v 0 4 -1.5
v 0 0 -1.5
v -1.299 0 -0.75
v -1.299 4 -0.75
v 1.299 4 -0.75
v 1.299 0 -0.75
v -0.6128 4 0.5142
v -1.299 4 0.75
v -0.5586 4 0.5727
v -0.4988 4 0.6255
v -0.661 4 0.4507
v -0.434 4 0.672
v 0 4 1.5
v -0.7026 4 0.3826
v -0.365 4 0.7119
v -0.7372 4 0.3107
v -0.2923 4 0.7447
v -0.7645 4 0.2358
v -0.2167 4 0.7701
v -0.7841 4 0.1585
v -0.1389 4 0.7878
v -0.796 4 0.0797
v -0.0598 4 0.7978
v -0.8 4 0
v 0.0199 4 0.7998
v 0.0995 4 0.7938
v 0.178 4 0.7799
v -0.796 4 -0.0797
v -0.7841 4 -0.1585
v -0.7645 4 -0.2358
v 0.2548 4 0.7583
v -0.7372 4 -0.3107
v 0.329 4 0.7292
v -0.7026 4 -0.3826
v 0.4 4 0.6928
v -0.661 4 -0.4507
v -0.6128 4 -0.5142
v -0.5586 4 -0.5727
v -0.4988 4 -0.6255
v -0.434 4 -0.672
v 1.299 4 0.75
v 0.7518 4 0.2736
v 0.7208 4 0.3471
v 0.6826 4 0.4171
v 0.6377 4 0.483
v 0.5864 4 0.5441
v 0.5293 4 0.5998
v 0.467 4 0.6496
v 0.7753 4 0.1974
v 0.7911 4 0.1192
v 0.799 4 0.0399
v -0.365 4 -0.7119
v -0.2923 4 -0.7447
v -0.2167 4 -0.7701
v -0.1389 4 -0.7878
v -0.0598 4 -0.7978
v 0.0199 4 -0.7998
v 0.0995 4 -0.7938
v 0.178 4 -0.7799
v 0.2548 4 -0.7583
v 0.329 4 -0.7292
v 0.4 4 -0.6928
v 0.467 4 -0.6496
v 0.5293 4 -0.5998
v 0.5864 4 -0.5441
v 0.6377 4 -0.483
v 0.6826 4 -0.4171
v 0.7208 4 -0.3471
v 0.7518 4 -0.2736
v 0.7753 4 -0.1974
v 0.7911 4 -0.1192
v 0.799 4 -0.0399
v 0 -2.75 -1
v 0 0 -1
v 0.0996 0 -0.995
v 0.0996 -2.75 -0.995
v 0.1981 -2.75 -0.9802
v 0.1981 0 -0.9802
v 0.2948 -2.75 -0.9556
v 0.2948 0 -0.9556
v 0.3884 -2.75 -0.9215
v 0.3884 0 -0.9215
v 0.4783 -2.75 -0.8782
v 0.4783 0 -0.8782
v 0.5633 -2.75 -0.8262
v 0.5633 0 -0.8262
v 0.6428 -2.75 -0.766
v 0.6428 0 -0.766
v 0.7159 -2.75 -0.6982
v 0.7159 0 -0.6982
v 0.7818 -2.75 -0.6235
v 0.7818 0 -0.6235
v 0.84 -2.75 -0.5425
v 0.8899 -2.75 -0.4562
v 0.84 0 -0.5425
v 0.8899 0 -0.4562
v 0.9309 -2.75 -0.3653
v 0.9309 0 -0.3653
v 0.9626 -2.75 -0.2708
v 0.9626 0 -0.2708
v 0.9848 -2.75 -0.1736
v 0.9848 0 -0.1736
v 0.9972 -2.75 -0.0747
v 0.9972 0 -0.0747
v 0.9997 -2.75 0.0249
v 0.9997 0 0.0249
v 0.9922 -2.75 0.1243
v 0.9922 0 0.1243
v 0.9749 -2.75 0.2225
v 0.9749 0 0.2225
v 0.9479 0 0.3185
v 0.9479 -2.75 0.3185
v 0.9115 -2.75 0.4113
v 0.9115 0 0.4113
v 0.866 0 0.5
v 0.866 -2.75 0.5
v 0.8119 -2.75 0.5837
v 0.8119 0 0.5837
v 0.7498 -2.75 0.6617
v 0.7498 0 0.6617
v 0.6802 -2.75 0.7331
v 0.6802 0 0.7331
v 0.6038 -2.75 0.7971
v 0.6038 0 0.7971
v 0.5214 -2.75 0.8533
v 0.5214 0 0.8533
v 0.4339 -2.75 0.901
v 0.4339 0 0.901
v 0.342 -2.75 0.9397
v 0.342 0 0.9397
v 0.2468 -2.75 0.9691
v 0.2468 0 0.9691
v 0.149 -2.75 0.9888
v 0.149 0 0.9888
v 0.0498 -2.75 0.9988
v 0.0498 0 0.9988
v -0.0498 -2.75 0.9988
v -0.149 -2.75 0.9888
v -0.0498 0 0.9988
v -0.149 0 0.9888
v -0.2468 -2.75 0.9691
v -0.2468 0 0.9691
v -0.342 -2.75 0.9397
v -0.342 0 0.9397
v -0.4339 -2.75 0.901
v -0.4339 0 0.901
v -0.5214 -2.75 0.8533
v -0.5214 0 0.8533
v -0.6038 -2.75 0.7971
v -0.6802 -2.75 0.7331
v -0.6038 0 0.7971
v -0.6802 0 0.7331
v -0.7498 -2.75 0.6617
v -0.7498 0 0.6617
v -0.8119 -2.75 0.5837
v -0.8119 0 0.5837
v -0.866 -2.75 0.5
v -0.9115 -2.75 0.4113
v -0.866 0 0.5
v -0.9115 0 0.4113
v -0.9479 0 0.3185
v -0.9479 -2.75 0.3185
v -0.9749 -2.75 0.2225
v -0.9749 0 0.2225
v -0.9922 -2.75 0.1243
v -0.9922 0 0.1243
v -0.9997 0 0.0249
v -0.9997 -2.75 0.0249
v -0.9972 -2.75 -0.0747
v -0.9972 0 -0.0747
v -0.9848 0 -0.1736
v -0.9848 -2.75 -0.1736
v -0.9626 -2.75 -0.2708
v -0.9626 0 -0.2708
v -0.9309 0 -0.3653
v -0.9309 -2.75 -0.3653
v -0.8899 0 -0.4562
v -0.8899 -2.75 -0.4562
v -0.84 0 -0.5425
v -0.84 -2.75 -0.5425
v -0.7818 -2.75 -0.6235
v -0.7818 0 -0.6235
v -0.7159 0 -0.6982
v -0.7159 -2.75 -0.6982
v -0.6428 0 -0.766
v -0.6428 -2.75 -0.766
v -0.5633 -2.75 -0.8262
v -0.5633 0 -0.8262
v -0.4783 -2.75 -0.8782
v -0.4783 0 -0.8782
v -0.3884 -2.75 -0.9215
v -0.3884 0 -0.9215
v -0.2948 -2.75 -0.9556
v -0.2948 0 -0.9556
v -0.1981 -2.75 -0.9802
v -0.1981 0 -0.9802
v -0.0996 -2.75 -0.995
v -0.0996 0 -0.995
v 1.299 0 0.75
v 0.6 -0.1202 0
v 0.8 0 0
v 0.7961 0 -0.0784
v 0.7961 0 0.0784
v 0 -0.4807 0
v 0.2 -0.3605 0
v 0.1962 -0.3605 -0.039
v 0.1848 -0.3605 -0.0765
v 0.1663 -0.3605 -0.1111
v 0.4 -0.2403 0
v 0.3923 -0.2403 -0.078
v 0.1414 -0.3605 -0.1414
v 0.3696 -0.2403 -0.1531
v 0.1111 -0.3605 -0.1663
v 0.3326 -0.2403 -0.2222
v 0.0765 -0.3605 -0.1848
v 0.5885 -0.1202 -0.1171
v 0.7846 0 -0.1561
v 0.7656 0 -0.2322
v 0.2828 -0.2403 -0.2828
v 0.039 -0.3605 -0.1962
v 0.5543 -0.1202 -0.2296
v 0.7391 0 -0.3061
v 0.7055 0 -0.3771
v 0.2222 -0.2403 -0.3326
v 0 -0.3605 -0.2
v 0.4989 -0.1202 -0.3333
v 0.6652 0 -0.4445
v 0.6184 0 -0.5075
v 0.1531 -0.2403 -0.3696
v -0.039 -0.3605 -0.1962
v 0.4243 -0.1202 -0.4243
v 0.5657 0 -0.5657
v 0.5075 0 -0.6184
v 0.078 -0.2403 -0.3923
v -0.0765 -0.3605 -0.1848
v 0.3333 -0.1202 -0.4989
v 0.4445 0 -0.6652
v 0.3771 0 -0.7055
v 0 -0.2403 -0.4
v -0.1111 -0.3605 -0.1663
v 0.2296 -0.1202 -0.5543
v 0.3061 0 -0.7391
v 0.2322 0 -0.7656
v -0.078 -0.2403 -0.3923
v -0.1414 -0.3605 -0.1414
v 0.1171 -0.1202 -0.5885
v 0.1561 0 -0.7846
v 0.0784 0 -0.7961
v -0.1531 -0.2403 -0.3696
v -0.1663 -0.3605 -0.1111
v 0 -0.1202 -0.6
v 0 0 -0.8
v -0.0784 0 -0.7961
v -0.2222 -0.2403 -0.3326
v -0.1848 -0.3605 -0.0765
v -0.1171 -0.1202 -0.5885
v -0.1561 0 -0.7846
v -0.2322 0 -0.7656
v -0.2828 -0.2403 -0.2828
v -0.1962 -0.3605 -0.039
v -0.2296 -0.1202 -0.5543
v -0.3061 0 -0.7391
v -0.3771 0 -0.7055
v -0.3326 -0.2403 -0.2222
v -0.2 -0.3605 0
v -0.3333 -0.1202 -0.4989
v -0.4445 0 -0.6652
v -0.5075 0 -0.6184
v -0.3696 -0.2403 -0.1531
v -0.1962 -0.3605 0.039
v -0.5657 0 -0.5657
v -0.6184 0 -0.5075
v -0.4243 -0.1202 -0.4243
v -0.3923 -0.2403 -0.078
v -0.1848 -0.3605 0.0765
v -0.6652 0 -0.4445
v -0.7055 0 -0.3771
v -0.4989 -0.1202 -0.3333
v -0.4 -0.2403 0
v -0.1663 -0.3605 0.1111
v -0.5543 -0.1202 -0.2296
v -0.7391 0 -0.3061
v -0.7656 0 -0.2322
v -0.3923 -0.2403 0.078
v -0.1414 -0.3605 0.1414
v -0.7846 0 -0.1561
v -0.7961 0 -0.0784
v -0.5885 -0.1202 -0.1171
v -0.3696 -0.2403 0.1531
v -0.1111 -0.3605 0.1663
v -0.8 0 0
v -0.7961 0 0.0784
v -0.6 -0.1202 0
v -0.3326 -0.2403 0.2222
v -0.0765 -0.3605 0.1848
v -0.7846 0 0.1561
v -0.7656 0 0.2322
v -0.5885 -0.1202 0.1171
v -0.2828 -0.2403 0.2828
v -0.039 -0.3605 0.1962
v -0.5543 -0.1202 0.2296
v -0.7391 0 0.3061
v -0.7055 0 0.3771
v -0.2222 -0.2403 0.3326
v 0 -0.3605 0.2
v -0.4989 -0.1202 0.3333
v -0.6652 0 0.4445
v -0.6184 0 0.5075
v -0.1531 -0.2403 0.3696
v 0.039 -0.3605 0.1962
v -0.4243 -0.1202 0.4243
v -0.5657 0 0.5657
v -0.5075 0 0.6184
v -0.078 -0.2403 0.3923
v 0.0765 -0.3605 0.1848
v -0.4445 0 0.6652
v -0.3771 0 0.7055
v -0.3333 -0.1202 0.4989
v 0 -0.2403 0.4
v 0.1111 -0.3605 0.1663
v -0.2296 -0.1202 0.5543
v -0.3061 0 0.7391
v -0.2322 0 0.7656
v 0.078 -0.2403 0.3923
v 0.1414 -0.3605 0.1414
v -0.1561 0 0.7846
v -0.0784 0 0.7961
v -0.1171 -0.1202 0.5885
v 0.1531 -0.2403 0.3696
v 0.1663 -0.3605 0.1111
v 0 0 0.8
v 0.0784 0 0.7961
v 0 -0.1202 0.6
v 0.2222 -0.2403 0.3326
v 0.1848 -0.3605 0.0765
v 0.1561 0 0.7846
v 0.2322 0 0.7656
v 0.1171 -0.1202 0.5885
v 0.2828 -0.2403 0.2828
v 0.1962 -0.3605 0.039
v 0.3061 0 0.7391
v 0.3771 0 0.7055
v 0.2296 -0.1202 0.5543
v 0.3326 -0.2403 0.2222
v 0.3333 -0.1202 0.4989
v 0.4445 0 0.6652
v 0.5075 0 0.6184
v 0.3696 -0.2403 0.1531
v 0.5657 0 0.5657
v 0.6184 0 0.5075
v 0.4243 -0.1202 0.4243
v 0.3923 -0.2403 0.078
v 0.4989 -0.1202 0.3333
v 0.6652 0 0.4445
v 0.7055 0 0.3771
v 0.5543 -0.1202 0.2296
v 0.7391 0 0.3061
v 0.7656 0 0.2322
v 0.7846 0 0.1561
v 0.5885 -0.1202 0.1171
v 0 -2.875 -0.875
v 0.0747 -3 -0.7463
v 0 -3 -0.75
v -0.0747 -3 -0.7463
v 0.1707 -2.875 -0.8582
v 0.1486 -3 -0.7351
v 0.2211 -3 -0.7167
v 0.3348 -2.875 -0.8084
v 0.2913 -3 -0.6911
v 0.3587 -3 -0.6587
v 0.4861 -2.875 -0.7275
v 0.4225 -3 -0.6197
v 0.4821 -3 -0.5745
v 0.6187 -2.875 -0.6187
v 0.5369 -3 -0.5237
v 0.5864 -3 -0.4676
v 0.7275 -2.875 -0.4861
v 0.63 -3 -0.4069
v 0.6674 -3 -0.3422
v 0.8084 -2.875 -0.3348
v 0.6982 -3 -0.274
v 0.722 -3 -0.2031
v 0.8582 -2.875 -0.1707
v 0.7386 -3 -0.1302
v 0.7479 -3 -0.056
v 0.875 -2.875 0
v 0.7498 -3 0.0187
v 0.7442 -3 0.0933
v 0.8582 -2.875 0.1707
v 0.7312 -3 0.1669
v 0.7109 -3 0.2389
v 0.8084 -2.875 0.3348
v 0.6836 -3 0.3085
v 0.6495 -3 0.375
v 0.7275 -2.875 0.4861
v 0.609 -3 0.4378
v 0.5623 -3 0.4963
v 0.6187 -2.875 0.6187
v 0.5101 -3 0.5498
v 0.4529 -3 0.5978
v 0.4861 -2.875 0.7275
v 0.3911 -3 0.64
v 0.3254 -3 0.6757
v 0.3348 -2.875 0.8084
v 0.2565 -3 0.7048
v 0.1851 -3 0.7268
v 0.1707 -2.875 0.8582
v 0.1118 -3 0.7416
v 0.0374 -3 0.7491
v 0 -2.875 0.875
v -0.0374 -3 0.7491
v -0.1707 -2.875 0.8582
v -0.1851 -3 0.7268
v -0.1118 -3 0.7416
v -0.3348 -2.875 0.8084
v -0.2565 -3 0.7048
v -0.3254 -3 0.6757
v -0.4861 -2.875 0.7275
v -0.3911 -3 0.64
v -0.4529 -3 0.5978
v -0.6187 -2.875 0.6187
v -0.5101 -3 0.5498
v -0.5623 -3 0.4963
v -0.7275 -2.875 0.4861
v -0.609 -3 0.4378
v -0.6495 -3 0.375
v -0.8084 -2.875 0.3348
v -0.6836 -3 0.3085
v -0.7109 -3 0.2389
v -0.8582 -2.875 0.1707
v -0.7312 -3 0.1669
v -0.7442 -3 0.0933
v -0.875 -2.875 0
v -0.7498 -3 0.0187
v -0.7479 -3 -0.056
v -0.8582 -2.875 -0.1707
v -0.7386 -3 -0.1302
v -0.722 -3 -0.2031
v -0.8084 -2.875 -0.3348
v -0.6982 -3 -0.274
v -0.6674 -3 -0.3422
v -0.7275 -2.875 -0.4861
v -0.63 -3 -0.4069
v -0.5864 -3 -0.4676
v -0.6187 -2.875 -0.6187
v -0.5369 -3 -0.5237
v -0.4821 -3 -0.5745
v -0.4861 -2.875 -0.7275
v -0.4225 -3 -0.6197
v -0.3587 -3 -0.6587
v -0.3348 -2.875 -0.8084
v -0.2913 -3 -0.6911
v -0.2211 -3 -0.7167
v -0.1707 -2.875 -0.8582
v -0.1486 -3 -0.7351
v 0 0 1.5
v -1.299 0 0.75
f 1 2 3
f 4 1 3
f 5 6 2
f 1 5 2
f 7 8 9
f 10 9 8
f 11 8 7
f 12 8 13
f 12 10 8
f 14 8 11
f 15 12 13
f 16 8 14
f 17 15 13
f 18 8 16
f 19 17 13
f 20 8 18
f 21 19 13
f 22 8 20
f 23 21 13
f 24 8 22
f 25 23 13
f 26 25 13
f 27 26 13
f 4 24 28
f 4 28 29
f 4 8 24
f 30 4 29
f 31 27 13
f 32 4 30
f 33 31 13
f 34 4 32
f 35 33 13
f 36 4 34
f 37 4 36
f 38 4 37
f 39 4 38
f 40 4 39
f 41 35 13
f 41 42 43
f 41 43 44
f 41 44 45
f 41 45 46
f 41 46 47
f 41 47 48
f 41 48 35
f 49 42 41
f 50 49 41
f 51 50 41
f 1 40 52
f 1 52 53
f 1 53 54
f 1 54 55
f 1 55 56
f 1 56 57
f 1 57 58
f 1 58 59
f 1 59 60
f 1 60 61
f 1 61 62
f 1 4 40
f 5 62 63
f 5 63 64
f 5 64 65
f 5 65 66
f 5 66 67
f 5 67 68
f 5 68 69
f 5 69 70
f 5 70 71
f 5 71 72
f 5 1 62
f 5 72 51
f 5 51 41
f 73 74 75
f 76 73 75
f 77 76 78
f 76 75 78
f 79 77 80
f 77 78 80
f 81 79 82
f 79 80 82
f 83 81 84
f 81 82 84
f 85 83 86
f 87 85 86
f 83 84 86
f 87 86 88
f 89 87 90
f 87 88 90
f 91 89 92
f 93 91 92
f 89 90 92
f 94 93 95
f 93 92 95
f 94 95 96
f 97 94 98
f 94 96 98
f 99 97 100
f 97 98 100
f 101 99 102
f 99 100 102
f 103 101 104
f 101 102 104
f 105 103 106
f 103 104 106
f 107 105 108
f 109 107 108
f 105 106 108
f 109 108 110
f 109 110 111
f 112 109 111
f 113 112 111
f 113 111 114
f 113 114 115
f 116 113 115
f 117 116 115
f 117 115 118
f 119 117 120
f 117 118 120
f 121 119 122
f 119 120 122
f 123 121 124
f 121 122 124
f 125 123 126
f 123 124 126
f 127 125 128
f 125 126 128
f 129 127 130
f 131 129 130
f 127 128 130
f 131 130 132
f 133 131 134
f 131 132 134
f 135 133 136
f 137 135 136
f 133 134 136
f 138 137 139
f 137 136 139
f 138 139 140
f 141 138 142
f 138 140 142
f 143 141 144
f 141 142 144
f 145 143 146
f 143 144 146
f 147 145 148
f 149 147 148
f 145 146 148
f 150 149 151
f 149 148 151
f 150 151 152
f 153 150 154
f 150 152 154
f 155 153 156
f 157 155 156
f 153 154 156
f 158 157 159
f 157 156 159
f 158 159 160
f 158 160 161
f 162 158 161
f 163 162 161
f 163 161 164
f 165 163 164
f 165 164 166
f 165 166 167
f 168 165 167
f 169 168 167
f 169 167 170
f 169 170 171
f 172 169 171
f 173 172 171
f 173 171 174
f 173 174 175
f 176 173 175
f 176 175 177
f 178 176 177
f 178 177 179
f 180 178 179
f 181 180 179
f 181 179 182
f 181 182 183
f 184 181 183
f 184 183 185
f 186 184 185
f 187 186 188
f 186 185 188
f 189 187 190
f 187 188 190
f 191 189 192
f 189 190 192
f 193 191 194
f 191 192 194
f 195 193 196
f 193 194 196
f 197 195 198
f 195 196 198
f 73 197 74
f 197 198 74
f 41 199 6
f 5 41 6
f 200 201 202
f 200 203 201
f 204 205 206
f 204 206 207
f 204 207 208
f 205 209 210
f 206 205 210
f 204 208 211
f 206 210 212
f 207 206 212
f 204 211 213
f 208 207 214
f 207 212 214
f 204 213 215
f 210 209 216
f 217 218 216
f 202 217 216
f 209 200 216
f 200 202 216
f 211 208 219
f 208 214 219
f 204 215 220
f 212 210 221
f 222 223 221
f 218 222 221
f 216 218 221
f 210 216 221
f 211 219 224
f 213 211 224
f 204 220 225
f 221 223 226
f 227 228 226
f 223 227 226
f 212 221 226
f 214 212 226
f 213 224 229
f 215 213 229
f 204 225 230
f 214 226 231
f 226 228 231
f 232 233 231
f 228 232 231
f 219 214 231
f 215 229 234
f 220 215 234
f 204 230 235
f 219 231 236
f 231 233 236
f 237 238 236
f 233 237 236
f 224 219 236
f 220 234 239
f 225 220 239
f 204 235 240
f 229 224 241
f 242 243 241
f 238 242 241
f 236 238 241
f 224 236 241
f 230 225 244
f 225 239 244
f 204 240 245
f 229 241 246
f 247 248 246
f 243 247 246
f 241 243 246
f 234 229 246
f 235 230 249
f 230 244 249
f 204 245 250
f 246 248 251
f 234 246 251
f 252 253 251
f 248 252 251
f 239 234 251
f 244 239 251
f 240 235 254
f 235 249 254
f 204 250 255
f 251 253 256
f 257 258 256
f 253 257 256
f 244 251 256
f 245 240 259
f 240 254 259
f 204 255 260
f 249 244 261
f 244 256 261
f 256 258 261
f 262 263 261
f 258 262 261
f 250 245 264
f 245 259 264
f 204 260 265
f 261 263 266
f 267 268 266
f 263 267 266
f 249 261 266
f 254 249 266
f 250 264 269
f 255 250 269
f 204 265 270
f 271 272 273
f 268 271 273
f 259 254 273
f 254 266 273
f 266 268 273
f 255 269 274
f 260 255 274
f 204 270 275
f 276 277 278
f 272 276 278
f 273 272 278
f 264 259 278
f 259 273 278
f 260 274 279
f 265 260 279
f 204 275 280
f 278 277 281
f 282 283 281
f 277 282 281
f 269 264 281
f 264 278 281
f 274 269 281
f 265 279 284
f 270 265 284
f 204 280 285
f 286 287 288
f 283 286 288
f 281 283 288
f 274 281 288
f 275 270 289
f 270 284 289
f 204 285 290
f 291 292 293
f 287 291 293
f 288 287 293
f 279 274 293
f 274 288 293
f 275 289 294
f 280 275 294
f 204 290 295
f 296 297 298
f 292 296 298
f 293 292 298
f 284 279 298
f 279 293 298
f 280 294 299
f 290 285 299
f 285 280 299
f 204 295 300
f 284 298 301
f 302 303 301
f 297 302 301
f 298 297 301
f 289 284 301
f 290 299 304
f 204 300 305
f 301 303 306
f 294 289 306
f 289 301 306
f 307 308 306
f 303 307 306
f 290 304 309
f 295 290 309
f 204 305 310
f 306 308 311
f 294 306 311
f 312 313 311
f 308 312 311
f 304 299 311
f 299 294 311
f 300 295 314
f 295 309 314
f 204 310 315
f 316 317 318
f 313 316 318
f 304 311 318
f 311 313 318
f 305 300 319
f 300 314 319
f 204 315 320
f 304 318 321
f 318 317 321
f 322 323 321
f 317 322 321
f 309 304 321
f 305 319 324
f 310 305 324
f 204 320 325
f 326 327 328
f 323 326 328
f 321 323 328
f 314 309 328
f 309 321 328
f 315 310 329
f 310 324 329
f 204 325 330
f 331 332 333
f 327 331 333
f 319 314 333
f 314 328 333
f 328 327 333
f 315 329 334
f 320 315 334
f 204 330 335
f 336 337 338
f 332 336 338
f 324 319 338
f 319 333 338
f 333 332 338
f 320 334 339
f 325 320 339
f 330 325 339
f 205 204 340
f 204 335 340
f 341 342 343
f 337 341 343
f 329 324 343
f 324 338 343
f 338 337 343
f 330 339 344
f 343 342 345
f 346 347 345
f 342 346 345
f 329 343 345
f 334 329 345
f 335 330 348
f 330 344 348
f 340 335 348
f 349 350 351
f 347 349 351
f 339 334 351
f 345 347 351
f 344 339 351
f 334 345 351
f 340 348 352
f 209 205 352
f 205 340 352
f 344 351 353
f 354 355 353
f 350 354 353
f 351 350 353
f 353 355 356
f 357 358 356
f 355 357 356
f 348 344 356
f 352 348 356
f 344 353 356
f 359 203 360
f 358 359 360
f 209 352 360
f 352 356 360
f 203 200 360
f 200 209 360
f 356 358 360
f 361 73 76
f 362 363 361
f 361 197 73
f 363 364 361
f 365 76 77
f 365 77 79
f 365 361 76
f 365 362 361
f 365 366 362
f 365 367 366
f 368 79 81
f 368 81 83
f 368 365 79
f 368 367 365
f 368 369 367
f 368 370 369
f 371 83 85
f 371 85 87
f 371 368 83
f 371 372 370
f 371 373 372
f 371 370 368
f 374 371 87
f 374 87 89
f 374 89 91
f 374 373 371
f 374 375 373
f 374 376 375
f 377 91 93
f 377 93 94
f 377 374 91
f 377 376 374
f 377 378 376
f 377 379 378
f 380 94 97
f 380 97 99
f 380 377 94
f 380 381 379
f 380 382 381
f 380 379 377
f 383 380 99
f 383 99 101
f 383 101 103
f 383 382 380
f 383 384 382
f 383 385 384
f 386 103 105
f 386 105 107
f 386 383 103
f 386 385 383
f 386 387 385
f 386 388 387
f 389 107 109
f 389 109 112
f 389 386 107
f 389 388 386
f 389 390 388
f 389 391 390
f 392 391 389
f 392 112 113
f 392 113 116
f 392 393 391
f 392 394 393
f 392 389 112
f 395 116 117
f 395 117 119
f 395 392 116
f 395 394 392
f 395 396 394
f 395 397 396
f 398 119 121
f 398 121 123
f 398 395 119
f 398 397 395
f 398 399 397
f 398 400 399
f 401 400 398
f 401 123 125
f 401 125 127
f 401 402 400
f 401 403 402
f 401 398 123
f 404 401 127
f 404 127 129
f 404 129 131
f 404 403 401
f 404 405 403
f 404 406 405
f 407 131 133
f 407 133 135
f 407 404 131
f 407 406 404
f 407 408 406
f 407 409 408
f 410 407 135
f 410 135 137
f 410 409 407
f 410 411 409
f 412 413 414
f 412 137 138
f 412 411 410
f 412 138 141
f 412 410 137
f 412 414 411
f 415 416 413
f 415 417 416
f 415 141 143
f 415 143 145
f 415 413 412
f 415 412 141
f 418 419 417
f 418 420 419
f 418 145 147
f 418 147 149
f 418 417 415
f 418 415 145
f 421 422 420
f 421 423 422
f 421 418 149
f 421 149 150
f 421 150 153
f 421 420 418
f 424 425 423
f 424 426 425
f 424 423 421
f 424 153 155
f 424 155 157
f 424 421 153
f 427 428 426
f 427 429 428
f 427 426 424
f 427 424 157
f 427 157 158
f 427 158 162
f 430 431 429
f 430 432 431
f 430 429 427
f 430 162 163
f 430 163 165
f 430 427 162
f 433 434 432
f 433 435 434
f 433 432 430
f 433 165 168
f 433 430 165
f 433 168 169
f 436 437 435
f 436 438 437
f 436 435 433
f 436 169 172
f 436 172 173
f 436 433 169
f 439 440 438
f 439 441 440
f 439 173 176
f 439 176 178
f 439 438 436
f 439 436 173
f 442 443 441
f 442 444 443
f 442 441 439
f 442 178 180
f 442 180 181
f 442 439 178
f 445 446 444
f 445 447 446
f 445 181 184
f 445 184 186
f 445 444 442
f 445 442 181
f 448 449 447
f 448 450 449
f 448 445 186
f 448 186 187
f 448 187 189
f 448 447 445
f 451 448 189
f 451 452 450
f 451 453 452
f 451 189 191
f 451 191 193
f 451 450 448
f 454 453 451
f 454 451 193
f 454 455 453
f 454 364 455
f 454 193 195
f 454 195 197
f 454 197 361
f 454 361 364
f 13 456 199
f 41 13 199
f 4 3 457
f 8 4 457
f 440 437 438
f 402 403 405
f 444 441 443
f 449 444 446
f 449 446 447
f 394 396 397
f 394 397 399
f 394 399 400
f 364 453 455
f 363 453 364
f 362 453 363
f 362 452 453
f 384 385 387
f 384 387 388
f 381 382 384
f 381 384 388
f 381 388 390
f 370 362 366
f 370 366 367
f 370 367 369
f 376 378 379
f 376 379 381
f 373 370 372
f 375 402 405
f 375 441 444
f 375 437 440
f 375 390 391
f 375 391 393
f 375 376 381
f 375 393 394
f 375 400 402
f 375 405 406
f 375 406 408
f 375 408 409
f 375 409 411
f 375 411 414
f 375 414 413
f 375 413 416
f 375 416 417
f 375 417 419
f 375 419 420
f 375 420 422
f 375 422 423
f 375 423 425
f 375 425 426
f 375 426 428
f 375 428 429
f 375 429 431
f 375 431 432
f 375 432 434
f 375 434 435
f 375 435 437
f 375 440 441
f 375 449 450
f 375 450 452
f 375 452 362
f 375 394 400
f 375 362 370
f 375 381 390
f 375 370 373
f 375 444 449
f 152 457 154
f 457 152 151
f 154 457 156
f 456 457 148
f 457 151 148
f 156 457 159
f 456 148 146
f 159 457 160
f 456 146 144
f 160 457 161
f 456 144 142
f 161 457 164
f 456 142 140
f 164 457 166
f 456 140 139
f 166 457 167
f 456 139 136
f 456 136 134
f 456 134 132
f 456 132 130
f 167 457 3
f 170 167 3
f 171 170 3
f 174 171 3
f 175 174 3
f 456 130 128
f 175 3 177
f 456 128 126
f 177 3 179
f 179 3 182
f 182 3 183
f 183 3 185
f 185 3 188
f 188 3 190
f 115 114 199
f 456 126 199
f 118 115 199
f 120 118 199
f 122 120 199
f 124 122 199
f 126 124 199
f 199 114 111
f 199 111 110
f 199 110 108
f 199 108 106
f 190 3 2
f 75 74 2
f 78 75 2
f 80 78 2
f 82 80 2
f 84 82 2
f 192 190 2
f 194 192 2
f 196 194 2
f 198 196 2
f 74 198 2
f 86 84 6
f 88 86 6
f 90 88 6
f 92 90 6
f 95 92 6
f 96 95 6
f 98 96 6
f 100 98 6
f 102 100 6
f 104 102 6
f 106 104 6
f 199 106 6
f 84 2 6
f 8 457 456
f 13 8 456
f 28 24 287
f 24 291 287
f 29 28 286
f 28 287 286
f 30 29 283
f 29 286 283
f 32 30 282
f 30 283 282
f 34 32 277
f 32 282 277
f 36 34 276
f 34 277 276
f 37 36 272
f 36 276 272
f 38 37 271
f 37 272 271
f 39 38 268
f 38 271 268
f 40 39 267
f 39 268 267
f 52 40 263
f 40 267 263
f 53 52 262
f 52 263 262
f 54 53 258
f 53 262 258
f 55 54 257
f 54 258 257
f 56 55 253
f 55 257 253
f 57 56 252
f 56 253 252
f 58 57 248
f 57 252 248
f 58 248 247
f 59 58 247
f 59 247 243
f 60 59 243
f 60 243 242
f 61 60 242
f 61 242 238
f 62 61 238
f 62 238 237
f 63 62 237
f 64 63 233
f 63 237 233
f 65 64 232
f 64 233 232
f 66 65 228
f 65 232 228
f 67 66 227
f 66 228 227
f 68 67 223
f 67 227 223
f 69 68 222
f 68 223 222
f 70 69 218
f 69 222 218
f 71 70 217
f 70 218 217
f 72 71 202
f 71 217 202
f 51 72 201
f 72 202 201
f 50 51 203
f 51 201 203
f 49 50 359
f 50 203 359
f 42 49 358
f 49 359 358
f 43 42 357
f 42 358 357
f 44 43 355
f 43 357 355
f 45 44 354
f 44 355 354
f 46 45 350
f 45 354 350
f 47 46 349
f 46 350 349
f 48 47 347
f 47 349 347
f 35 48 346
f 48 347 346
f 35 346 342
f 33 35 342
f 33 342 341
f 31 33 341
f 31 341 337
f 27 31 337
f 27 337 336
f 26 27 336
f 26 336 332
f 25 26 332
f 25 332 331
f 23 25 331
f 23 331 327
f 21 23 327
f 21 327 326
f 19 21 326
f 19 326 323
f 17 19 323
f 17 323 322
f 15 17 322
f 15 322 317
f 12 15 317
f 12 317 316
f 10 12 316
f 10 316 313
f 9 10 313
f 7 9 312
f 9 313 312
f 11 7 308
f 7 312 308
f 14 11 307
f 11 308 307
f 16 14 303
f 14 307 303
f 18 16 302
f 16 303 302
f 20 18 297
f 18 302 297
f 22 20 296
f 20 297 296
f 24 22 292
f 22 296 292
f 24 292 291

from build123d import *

# Parameters (mm, degrees)
EXTRUDE_1_DEPTH       = 4
SKETCH_4_R            = 1
EXTRUDE_2_DEPTH       = 3
CHAMFER_1_SIZE        = 0.25
HOLE_WIZARD_M23_D     = 1.6
HOLE_WIZARD_M23_DEPTH = 4
HOLE_WIZARD_M23_TIP   = 0.480688495


with BuildPart() as part:
    # Эскиз1 → Бобышка-Вытянуть1 (new body)
    with BuildSketch(Plane(origin=(0, 0, 0), x_dir=(1, 0, 0), z_dir=(0, 1, 0))):
        Polygon((0, 1.5), (-1.299038106, 0.75), (-1.299038106, -0.75), (0, -1.5), (1.299038106, -0.75), (1.299038106, 0.75), align=None)
    extrude(amount=EXTRUDE_1_DEPTH)

    # Эскиз4 → Бобышка-Вытянуть2 (add)
    with BuildSketch(Plane.XZ):
        with Locations(Location((0, 0, 0), (0, 0, 270))):
            Circle(SKETCH_4_R)
    extrude(amount=EXTRUDE_2_DEPTH)

    # Фаска1
    chamfer_1_edges = [part.edges().sort_by_distance(p)[0] for p in [
        (0, -3, 1),
    ]]
    chamfer(chamfer_1_edges, length=CHAMFER_1_SIZE)

    # Отверстие обработанное метчиком M23
    with Locations(Plane(origin=(0, 4, 0), x_dir=(1, 0, 0), z_dir=(0, 1, 0))):
        with Locations((0, 0)):
            Hole(HOLE_WIZARD_M23_D / 2, depth=HOLE_WIZARD_M23_DEPTH)
            with Locations((0, 0, -(HOLE_WIZARD_M23_DEPTH + HOLE_WIZARD_M23_TIP / 2))):  # 118° drill point
                Cone(0, HOLE_WIZARD_M23_D / 2, HOLE_WIZARD_M23_TIP, mode=Mode.SUBTRACT)


solid = part.part
